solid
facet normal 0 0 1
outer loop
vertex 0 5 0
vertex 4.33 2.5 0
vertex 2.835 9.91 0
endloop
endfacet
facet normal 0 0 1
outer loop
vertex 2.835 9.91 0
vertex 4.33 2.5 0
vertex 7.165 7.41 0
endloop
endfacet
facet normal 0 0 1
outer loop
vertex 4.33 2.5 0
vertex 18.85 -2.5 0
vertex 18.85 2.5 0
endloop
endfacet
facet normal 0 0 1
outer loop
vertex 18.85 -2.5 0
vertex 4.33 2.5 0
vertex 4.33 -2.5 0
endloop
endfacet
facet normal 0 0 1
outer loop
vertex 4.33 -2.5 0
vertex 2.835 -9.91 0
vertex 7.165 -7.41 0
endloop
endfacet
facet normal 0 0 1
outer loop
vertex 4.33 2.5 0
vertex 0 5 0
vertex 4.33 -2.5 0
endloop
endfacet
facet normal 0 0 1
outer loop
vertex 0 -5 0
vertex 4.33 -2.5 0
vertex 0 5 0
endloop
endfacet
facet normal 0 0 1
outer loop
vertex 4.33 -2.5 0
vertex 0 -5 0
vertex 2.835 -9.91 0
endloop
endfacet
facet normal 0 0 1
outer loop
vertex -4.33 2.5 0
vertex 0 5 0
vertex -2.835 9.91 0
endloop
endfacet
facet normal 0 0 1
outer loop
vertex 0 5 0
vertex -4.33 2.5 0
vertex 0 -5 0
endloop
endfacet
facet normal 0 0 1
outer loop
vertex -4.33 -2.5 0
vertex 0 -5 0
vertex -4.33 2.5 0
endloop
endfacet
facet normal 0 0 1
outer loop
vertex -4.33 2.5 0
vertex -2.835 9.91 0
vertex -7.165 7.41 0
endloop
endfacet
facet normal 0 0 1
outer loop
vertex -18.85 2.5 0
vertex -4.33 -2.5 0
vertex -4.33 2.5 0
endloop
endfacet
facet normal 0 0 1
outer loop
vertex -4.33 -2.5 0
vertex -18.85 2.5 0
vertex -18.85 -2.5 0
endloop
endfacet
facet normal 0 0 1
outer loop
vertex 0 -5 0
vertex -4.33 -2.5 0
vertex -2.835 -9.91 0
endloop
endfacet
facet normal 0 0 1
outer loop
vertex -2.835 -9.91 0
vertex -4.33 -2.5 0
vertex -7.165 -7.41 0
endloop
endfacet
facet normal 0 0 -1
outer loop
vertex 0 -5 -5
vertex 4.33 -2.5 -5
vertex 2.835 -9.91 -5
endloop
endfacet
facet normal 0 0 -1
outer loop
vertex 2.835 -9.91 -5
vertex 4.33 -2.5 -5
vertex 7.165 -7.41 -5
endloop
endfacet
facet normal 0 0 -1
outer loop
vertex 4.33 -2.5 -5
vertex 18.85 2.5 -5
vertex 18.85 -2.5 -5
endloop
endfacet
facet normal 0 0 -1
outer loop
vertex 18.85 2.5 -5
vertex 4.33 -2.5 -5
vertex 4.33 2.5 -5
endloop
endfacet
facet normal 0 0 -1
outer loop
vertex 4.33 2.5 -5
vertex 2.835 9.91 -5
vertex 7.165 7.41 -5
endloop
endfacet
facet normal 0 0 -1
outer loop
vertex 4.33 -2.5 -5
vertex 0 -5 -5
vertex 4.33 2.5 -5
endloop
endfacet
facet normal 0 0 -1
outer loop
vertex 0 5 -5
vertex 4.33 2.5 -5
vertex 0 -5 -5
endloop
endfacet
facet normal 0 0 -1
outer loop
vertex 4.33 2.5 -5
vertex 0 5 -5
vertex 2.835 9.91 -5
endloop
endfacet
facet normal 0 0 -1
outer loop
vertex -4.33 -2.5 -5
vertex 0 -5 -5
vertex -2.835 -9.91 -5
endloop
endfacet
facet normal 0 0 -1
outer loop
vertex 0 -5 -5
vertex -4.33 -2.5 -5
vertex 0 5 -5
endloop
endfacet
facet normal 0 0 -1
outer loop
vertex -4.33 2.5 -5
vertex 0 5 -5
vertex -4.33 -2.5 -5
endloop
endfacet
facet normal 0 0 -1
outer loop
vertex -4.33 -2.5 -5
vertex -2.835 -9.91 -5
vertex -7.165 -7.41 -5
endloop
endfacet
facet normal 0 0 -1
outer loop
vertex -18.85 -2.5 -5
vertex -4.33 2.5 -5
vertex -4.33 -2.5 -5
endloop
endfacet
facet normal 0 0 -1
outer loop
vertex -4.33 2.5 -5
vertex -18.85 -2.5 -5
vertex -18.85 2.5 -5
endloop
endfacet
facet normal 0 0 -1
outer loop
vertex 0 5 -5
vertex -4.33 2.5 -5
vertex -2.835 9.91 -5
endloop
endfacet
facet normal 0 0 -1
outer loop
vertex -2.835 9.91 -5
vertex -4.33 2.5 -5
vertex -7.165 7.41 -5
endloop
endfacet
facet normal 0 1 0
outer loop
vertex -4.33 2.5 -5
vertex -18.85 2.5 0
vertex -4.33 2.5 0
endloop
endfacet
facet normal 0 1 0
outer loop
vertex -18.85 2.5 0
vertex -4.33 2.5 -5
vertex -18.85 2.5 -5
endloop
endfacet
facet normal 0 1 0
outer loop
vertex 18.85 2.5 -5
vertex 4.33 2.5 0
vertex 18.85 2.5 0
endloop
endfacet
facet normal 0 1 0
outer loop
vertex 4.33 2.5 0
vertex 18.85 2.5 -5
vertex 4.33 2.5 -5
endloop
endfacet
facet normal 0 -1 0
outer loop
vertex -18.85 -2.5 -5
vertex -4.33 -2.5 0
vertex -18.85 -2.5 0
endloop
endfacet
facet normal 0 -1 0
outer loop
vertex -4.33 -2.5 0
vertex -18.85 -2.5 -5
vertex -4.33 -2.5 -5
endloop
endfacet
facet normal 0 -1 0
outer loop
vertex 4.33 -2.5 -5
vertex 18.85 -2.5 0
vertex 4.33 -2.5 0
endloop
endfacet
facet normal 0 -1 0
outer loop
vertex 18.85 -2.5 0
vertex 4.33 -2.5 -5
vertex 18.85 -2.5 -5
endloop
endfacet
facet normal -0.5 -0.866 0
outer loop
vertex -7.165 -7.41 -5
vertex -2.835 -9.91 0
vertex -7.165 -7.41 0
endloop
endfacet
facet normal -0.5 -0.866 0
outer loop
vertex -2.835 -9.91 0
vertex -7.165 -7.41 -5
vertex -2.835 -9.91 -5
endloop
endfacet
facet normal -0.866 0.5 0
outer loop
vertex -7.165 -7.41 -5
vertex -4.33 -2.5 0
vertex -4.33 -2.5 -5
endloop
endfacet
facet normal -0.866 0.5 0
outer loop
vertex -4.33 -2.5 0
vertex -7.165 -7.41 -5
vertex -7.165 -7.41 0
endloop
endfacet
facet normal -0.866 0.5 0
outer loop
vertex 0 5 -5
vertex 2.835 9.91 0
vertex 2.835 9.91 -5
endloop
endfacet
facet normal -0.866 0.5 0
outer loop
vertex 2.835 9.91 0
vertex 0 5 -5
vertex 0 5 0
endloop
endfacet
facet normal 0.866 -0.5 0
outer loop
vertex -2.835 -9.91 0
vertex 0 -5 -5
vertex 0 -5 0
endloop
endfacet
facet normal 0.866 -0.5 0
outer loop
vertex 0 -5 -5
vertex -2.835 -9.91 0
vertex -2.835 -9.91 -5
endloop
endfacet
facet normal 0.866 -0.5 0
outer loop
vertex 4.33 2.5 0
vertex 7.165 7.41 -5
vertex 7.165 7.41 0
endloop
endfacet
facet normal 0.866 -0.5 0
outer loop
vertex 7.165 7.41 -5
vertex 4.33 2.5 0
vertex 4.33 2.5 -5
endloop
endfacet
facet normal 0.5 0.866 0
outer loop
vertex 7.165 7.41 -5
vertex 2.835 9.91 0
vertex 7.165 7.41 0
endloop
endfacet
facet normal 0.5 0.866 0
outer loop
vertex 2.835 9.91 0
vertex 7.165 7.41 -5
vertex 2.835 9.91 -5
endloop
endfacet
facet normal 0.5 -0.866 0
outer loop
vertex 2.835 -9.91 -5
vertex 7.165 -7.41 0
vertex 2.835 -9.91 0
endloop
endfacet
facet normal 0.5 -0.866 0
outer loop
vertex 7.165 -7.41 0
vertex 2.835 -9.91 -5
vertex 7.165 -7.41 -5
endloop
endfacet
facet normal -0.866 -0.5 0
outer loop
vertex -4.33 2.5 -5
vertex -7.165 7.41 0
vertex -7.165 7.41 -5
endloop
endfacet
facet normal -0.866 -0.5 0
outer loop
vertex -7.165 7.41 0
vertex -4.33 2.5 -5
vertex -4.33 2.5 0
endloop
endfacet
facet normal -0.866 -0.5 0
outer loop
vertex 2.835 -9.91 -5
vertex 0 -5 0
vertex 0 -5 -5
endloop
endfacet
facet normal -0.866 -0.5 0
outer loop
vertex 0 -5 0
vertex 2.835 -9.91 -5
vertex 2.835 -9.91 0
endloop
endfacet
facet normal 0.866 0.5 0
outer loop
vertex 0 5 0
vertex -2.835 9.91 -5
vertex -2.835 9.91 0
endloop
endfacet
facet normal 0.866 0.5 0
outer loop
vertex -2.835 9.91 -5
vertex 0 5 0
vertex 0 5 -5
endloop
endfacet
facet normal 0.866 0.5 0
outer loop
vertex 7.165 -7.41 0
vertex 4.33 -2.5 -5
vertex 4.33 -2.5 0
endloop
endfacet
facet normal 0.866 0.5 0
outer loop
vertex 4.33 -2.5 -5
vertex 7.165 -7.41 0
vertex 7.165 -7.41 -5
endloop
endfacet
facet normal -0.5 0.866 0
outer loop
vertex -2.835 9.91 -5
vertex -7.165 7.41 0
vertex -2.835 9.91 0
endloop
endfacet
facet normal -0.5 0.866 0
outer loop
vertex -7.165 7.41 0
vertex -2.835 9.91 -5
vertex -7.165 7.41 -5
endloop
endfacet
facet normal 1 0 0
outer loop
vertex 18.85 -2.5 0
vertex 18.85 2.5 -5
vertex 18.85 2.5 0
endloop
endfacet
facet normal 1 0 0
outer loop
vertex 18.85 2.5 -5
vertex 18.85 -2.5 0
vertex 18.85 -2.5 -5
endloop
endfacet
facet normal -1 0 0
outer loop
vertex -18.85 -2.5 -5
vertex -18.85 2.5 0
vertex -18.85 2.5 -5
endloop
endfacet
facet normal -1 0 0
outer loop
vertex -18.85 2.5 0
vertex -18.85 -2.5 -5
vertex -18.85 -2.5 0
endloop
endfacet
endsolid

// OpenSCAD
module starburst() {
    // Main long bar
    translate([-18.85, -2.5, -2.5])
        cube([37.7, 5, 5]);

    // Shorter spokes
    for (i = [0:5]) {
        rotate([0, 0, i * 60])
            translate([-10, -2.5, -2.5])
                cube([20, 5, 5]);
    }
}

translate([0, 0, -2.5])
    starburst();
